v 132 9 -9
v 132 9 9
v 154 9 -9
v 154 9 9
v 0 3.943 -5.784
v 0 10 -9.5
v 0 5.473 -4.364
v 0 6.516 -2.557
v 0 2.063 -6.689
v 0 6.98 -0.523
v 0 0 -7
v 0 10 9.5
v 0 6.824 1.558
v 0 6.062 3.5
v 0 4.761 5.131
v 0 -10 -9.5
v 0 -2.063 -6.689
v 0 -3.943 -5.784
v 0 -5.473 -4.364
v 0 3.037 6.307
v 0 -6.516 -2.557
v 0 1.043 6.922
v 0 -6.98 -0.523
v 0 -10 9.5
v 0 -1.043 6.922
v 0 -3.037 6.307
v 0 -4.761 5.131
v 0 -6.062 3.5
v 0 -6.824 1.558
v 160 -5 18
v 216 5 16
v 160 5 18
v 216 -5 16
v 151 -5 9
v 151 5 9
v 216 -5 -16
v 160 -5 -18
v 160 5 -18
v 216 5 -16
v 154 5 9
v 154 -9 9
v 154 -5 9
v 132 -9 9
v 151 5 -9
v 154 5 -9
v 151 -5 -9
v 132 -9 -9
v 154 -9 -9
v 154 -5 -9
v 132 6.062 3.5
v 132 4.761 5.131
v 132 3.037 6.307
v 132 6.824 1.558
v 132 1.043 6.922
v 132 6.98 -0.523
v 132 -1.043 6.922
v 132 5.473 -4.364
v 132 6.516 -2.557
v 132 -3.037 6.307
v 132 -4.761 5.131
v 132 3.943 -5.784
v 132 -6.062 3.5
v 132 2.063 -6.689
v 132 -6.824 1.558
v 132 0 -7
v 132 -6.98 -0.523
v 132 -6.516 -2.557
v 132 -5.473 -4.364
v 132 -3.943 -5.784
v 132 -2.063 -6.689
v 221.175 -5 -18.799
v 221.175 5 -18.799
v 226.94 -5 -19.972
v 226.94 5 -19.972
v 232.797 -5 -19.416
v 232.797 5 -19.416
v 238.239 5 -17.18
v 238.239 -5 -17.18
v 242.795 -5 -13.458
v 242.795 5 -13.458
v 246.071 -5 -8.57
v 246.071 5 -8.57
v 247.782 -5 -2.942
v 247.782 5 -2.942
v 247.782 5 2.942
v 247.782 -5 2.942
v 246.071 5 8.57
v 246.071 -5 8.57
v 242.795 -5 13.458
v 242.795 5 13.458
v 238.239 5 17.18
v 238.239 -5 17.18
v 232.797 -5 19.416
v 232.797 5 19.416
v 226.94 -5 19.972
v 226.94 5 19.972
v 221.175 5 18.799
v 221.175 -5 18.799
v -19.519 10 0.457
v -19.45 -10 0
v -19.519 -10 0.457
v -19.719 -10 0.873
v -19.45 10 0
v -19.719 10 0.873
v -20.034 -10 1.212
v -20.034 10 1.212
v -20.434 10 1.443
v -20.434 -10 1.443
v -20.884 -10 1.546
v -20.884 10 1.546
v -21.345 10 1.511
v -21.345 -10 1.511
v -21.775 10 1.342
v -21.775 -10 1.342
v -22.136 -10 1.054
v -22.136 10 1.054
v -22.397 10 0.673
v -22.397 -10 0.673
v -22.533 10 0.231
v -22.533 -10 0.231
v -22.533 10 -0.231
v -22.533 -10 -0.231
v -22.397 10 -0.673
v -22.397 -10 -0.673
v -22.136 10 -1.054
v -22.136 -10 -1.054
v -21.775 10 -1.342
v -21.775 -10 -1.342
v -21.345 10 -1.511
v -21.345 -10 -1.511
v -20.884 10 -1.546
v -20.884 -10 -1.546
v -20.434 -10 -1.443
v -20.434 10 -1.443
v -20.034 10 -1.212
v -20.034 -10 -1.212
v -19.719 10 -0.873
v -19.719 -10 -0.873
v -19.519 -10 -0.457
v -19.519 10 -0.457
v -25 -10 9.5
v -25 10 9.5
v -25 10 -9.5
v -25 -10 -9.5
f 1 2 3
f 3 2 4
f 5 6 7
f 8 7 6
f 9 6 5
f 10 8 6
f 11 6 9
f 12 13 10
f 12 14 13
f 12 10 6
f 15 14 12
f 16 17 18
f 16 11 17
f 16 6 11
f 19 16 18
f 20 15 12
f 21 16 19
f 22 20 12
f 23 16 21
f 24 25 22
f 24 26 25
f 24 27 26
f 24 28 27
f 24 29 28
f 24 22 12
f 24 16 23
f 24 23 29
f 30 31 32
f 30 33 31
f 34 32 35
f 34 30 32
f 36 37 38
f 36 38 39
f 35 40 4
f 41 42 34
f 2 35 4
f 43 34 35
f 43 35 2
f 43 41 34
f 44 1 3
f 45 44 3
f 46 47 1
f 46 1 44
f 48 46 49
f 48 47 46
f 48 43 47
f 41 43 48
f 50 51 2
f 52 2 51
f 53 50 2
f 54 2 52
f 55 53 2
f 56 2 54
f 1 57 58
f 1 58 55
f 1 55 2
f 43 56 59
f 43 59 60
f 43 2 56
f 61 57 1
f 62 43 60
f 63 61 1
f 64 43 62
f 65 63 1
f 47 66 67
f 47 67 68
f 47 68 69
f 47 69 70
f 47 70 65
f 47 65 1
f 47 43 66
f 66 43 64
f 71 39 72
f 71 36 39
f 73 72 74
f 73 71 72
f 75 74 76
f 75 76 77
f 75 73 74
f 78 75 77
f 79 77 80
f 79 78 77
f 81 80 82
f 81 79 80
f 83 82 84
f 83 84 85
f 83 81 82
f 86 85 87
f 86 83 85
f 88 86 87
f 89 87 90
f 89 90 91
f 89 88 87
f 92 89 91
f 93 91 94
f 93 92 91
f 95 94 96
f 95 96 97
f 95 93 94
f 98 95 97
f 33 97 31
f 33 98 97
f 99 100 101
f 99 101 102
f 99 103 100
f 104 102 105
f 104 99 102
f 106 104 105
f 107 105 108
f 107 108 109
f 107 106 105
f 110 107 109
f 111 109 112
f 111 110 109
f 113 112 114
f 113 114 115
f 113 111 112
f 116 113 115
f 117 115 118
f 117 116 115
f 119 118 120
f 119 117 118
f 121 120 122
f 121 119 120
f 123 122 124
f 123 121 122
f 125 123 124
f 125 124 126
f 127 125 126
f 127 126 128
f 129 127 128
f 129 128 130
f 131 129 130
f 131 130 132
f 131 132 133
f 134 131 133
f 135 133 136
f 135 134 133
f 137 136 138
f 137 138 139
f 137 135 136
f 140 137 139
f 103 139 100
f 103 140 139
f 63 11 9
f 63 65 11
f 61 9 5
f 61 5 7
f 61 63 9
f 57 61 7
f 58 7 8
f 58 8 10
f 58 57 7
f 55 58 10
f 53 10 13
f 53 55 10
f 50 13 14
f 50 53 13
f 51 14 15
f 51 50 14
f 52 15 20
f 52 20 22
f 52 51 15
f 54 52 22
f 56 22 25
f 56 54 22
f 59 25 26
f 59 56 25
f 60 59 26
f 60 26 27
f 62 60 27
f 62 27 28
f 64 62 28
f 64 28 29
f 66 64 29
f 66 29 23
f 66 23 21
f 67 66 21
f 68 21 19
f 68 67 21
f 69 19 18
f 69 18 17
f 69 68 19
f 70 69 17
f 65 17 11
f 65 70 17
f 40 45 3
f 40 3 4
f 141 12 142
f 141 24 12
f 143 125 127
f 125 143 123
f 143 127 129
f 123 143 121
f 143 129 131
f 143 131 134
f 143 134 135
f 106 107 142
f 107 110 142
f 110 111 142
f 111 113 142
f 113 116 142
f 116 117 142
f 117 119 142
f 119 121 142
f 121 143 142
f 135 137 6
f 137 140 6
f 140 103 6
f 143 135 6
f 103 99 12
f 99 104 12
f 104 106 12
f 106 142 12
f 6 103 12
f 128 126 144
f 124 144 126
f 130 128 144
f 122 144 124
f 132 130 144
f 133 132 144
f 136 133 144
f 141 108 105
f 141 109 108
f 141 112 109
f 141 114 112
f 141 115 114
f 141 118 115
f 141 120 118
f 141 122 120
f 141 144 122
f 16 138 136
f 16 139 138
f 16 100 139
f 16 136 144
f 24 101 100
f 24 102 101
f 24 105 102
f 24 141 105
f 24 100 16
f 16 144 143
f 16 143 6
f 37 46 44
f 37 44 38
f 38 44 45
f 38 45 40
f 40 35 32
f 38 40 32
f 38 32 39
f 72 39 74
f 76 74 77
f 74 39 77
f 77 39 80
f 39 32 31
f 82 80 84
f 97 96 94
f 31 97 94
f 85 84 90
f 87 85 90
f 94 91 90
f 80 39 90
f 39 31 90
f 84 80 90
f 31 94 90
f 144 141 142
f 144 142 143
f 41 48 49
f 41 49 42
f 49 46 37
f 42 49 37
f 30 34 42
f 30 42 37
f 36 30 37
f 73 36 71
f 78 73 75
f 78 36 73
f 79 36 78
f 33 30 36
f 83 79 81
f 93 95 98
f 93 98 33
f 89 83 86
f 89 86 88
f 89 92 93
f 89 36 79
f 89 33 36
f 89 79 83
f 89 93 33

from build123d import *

# Parameters (mm, degrees)
F0_W     = 132
F0_H     = 7
F2_DEPTH = 9
F3_DEPTH = 5
F0_R     = 1.55
F4_DEPTH = 10


with BuildPart() as f1:
    # F0 (on Front) → F1 (revolve)
    with BuildSketch(Plane.XZ):
        with Locations((66, -3.5)):
            Rectangle(F0_W, F0_H)
    revolve(axis=Axis((66, 0, 0), (1, 0, 0)))

    # F0 (on Front) → F2 (join, symmetric)
    with BuildSketch(Plane.XZ):
        Polygon((132, 9), (132, 0), (132, -7), (132, -9), (151, -9), (154, -9), (154, 9), (151, 9), align=None)
    extrude(amount=F2_DEPTH, both=True)

    # F0 (on Front) → F3 (join, symmetric)
    with BuildSketch(Plane.XZ):
        with BuildLine():
            Line((160, 18), (151, 9))
            Line((151, 9), (154, 9))
            Line((154, 9), (154, -9))
            Line((154, -9), (151, -9))
            Line((151, -9), (160, -18))
            Line((160, -18), (216, -16))
            ThreePointArc((216, -16), (248, 0), (216, 16))
            Line((216, 16), (160, 18))
        make_face()
    extrude(amount=F3_DEPTH, both=True)

    # F0 (on Front) → F4 (join, symmetric)
    with BuildSketch(Plane.XZ):
        Polygon((0, -7), (0, 0), (0, 9.5), (-25, 9.5), (-25, -9.5), (0, -9.5), align=None)
        with Locations((-21, 0)):
            Circle(F0_R, mode=Mode.SUBTRACT)
    extrude(amount=F4_DEPTH, both=True)


solid = f1.part
